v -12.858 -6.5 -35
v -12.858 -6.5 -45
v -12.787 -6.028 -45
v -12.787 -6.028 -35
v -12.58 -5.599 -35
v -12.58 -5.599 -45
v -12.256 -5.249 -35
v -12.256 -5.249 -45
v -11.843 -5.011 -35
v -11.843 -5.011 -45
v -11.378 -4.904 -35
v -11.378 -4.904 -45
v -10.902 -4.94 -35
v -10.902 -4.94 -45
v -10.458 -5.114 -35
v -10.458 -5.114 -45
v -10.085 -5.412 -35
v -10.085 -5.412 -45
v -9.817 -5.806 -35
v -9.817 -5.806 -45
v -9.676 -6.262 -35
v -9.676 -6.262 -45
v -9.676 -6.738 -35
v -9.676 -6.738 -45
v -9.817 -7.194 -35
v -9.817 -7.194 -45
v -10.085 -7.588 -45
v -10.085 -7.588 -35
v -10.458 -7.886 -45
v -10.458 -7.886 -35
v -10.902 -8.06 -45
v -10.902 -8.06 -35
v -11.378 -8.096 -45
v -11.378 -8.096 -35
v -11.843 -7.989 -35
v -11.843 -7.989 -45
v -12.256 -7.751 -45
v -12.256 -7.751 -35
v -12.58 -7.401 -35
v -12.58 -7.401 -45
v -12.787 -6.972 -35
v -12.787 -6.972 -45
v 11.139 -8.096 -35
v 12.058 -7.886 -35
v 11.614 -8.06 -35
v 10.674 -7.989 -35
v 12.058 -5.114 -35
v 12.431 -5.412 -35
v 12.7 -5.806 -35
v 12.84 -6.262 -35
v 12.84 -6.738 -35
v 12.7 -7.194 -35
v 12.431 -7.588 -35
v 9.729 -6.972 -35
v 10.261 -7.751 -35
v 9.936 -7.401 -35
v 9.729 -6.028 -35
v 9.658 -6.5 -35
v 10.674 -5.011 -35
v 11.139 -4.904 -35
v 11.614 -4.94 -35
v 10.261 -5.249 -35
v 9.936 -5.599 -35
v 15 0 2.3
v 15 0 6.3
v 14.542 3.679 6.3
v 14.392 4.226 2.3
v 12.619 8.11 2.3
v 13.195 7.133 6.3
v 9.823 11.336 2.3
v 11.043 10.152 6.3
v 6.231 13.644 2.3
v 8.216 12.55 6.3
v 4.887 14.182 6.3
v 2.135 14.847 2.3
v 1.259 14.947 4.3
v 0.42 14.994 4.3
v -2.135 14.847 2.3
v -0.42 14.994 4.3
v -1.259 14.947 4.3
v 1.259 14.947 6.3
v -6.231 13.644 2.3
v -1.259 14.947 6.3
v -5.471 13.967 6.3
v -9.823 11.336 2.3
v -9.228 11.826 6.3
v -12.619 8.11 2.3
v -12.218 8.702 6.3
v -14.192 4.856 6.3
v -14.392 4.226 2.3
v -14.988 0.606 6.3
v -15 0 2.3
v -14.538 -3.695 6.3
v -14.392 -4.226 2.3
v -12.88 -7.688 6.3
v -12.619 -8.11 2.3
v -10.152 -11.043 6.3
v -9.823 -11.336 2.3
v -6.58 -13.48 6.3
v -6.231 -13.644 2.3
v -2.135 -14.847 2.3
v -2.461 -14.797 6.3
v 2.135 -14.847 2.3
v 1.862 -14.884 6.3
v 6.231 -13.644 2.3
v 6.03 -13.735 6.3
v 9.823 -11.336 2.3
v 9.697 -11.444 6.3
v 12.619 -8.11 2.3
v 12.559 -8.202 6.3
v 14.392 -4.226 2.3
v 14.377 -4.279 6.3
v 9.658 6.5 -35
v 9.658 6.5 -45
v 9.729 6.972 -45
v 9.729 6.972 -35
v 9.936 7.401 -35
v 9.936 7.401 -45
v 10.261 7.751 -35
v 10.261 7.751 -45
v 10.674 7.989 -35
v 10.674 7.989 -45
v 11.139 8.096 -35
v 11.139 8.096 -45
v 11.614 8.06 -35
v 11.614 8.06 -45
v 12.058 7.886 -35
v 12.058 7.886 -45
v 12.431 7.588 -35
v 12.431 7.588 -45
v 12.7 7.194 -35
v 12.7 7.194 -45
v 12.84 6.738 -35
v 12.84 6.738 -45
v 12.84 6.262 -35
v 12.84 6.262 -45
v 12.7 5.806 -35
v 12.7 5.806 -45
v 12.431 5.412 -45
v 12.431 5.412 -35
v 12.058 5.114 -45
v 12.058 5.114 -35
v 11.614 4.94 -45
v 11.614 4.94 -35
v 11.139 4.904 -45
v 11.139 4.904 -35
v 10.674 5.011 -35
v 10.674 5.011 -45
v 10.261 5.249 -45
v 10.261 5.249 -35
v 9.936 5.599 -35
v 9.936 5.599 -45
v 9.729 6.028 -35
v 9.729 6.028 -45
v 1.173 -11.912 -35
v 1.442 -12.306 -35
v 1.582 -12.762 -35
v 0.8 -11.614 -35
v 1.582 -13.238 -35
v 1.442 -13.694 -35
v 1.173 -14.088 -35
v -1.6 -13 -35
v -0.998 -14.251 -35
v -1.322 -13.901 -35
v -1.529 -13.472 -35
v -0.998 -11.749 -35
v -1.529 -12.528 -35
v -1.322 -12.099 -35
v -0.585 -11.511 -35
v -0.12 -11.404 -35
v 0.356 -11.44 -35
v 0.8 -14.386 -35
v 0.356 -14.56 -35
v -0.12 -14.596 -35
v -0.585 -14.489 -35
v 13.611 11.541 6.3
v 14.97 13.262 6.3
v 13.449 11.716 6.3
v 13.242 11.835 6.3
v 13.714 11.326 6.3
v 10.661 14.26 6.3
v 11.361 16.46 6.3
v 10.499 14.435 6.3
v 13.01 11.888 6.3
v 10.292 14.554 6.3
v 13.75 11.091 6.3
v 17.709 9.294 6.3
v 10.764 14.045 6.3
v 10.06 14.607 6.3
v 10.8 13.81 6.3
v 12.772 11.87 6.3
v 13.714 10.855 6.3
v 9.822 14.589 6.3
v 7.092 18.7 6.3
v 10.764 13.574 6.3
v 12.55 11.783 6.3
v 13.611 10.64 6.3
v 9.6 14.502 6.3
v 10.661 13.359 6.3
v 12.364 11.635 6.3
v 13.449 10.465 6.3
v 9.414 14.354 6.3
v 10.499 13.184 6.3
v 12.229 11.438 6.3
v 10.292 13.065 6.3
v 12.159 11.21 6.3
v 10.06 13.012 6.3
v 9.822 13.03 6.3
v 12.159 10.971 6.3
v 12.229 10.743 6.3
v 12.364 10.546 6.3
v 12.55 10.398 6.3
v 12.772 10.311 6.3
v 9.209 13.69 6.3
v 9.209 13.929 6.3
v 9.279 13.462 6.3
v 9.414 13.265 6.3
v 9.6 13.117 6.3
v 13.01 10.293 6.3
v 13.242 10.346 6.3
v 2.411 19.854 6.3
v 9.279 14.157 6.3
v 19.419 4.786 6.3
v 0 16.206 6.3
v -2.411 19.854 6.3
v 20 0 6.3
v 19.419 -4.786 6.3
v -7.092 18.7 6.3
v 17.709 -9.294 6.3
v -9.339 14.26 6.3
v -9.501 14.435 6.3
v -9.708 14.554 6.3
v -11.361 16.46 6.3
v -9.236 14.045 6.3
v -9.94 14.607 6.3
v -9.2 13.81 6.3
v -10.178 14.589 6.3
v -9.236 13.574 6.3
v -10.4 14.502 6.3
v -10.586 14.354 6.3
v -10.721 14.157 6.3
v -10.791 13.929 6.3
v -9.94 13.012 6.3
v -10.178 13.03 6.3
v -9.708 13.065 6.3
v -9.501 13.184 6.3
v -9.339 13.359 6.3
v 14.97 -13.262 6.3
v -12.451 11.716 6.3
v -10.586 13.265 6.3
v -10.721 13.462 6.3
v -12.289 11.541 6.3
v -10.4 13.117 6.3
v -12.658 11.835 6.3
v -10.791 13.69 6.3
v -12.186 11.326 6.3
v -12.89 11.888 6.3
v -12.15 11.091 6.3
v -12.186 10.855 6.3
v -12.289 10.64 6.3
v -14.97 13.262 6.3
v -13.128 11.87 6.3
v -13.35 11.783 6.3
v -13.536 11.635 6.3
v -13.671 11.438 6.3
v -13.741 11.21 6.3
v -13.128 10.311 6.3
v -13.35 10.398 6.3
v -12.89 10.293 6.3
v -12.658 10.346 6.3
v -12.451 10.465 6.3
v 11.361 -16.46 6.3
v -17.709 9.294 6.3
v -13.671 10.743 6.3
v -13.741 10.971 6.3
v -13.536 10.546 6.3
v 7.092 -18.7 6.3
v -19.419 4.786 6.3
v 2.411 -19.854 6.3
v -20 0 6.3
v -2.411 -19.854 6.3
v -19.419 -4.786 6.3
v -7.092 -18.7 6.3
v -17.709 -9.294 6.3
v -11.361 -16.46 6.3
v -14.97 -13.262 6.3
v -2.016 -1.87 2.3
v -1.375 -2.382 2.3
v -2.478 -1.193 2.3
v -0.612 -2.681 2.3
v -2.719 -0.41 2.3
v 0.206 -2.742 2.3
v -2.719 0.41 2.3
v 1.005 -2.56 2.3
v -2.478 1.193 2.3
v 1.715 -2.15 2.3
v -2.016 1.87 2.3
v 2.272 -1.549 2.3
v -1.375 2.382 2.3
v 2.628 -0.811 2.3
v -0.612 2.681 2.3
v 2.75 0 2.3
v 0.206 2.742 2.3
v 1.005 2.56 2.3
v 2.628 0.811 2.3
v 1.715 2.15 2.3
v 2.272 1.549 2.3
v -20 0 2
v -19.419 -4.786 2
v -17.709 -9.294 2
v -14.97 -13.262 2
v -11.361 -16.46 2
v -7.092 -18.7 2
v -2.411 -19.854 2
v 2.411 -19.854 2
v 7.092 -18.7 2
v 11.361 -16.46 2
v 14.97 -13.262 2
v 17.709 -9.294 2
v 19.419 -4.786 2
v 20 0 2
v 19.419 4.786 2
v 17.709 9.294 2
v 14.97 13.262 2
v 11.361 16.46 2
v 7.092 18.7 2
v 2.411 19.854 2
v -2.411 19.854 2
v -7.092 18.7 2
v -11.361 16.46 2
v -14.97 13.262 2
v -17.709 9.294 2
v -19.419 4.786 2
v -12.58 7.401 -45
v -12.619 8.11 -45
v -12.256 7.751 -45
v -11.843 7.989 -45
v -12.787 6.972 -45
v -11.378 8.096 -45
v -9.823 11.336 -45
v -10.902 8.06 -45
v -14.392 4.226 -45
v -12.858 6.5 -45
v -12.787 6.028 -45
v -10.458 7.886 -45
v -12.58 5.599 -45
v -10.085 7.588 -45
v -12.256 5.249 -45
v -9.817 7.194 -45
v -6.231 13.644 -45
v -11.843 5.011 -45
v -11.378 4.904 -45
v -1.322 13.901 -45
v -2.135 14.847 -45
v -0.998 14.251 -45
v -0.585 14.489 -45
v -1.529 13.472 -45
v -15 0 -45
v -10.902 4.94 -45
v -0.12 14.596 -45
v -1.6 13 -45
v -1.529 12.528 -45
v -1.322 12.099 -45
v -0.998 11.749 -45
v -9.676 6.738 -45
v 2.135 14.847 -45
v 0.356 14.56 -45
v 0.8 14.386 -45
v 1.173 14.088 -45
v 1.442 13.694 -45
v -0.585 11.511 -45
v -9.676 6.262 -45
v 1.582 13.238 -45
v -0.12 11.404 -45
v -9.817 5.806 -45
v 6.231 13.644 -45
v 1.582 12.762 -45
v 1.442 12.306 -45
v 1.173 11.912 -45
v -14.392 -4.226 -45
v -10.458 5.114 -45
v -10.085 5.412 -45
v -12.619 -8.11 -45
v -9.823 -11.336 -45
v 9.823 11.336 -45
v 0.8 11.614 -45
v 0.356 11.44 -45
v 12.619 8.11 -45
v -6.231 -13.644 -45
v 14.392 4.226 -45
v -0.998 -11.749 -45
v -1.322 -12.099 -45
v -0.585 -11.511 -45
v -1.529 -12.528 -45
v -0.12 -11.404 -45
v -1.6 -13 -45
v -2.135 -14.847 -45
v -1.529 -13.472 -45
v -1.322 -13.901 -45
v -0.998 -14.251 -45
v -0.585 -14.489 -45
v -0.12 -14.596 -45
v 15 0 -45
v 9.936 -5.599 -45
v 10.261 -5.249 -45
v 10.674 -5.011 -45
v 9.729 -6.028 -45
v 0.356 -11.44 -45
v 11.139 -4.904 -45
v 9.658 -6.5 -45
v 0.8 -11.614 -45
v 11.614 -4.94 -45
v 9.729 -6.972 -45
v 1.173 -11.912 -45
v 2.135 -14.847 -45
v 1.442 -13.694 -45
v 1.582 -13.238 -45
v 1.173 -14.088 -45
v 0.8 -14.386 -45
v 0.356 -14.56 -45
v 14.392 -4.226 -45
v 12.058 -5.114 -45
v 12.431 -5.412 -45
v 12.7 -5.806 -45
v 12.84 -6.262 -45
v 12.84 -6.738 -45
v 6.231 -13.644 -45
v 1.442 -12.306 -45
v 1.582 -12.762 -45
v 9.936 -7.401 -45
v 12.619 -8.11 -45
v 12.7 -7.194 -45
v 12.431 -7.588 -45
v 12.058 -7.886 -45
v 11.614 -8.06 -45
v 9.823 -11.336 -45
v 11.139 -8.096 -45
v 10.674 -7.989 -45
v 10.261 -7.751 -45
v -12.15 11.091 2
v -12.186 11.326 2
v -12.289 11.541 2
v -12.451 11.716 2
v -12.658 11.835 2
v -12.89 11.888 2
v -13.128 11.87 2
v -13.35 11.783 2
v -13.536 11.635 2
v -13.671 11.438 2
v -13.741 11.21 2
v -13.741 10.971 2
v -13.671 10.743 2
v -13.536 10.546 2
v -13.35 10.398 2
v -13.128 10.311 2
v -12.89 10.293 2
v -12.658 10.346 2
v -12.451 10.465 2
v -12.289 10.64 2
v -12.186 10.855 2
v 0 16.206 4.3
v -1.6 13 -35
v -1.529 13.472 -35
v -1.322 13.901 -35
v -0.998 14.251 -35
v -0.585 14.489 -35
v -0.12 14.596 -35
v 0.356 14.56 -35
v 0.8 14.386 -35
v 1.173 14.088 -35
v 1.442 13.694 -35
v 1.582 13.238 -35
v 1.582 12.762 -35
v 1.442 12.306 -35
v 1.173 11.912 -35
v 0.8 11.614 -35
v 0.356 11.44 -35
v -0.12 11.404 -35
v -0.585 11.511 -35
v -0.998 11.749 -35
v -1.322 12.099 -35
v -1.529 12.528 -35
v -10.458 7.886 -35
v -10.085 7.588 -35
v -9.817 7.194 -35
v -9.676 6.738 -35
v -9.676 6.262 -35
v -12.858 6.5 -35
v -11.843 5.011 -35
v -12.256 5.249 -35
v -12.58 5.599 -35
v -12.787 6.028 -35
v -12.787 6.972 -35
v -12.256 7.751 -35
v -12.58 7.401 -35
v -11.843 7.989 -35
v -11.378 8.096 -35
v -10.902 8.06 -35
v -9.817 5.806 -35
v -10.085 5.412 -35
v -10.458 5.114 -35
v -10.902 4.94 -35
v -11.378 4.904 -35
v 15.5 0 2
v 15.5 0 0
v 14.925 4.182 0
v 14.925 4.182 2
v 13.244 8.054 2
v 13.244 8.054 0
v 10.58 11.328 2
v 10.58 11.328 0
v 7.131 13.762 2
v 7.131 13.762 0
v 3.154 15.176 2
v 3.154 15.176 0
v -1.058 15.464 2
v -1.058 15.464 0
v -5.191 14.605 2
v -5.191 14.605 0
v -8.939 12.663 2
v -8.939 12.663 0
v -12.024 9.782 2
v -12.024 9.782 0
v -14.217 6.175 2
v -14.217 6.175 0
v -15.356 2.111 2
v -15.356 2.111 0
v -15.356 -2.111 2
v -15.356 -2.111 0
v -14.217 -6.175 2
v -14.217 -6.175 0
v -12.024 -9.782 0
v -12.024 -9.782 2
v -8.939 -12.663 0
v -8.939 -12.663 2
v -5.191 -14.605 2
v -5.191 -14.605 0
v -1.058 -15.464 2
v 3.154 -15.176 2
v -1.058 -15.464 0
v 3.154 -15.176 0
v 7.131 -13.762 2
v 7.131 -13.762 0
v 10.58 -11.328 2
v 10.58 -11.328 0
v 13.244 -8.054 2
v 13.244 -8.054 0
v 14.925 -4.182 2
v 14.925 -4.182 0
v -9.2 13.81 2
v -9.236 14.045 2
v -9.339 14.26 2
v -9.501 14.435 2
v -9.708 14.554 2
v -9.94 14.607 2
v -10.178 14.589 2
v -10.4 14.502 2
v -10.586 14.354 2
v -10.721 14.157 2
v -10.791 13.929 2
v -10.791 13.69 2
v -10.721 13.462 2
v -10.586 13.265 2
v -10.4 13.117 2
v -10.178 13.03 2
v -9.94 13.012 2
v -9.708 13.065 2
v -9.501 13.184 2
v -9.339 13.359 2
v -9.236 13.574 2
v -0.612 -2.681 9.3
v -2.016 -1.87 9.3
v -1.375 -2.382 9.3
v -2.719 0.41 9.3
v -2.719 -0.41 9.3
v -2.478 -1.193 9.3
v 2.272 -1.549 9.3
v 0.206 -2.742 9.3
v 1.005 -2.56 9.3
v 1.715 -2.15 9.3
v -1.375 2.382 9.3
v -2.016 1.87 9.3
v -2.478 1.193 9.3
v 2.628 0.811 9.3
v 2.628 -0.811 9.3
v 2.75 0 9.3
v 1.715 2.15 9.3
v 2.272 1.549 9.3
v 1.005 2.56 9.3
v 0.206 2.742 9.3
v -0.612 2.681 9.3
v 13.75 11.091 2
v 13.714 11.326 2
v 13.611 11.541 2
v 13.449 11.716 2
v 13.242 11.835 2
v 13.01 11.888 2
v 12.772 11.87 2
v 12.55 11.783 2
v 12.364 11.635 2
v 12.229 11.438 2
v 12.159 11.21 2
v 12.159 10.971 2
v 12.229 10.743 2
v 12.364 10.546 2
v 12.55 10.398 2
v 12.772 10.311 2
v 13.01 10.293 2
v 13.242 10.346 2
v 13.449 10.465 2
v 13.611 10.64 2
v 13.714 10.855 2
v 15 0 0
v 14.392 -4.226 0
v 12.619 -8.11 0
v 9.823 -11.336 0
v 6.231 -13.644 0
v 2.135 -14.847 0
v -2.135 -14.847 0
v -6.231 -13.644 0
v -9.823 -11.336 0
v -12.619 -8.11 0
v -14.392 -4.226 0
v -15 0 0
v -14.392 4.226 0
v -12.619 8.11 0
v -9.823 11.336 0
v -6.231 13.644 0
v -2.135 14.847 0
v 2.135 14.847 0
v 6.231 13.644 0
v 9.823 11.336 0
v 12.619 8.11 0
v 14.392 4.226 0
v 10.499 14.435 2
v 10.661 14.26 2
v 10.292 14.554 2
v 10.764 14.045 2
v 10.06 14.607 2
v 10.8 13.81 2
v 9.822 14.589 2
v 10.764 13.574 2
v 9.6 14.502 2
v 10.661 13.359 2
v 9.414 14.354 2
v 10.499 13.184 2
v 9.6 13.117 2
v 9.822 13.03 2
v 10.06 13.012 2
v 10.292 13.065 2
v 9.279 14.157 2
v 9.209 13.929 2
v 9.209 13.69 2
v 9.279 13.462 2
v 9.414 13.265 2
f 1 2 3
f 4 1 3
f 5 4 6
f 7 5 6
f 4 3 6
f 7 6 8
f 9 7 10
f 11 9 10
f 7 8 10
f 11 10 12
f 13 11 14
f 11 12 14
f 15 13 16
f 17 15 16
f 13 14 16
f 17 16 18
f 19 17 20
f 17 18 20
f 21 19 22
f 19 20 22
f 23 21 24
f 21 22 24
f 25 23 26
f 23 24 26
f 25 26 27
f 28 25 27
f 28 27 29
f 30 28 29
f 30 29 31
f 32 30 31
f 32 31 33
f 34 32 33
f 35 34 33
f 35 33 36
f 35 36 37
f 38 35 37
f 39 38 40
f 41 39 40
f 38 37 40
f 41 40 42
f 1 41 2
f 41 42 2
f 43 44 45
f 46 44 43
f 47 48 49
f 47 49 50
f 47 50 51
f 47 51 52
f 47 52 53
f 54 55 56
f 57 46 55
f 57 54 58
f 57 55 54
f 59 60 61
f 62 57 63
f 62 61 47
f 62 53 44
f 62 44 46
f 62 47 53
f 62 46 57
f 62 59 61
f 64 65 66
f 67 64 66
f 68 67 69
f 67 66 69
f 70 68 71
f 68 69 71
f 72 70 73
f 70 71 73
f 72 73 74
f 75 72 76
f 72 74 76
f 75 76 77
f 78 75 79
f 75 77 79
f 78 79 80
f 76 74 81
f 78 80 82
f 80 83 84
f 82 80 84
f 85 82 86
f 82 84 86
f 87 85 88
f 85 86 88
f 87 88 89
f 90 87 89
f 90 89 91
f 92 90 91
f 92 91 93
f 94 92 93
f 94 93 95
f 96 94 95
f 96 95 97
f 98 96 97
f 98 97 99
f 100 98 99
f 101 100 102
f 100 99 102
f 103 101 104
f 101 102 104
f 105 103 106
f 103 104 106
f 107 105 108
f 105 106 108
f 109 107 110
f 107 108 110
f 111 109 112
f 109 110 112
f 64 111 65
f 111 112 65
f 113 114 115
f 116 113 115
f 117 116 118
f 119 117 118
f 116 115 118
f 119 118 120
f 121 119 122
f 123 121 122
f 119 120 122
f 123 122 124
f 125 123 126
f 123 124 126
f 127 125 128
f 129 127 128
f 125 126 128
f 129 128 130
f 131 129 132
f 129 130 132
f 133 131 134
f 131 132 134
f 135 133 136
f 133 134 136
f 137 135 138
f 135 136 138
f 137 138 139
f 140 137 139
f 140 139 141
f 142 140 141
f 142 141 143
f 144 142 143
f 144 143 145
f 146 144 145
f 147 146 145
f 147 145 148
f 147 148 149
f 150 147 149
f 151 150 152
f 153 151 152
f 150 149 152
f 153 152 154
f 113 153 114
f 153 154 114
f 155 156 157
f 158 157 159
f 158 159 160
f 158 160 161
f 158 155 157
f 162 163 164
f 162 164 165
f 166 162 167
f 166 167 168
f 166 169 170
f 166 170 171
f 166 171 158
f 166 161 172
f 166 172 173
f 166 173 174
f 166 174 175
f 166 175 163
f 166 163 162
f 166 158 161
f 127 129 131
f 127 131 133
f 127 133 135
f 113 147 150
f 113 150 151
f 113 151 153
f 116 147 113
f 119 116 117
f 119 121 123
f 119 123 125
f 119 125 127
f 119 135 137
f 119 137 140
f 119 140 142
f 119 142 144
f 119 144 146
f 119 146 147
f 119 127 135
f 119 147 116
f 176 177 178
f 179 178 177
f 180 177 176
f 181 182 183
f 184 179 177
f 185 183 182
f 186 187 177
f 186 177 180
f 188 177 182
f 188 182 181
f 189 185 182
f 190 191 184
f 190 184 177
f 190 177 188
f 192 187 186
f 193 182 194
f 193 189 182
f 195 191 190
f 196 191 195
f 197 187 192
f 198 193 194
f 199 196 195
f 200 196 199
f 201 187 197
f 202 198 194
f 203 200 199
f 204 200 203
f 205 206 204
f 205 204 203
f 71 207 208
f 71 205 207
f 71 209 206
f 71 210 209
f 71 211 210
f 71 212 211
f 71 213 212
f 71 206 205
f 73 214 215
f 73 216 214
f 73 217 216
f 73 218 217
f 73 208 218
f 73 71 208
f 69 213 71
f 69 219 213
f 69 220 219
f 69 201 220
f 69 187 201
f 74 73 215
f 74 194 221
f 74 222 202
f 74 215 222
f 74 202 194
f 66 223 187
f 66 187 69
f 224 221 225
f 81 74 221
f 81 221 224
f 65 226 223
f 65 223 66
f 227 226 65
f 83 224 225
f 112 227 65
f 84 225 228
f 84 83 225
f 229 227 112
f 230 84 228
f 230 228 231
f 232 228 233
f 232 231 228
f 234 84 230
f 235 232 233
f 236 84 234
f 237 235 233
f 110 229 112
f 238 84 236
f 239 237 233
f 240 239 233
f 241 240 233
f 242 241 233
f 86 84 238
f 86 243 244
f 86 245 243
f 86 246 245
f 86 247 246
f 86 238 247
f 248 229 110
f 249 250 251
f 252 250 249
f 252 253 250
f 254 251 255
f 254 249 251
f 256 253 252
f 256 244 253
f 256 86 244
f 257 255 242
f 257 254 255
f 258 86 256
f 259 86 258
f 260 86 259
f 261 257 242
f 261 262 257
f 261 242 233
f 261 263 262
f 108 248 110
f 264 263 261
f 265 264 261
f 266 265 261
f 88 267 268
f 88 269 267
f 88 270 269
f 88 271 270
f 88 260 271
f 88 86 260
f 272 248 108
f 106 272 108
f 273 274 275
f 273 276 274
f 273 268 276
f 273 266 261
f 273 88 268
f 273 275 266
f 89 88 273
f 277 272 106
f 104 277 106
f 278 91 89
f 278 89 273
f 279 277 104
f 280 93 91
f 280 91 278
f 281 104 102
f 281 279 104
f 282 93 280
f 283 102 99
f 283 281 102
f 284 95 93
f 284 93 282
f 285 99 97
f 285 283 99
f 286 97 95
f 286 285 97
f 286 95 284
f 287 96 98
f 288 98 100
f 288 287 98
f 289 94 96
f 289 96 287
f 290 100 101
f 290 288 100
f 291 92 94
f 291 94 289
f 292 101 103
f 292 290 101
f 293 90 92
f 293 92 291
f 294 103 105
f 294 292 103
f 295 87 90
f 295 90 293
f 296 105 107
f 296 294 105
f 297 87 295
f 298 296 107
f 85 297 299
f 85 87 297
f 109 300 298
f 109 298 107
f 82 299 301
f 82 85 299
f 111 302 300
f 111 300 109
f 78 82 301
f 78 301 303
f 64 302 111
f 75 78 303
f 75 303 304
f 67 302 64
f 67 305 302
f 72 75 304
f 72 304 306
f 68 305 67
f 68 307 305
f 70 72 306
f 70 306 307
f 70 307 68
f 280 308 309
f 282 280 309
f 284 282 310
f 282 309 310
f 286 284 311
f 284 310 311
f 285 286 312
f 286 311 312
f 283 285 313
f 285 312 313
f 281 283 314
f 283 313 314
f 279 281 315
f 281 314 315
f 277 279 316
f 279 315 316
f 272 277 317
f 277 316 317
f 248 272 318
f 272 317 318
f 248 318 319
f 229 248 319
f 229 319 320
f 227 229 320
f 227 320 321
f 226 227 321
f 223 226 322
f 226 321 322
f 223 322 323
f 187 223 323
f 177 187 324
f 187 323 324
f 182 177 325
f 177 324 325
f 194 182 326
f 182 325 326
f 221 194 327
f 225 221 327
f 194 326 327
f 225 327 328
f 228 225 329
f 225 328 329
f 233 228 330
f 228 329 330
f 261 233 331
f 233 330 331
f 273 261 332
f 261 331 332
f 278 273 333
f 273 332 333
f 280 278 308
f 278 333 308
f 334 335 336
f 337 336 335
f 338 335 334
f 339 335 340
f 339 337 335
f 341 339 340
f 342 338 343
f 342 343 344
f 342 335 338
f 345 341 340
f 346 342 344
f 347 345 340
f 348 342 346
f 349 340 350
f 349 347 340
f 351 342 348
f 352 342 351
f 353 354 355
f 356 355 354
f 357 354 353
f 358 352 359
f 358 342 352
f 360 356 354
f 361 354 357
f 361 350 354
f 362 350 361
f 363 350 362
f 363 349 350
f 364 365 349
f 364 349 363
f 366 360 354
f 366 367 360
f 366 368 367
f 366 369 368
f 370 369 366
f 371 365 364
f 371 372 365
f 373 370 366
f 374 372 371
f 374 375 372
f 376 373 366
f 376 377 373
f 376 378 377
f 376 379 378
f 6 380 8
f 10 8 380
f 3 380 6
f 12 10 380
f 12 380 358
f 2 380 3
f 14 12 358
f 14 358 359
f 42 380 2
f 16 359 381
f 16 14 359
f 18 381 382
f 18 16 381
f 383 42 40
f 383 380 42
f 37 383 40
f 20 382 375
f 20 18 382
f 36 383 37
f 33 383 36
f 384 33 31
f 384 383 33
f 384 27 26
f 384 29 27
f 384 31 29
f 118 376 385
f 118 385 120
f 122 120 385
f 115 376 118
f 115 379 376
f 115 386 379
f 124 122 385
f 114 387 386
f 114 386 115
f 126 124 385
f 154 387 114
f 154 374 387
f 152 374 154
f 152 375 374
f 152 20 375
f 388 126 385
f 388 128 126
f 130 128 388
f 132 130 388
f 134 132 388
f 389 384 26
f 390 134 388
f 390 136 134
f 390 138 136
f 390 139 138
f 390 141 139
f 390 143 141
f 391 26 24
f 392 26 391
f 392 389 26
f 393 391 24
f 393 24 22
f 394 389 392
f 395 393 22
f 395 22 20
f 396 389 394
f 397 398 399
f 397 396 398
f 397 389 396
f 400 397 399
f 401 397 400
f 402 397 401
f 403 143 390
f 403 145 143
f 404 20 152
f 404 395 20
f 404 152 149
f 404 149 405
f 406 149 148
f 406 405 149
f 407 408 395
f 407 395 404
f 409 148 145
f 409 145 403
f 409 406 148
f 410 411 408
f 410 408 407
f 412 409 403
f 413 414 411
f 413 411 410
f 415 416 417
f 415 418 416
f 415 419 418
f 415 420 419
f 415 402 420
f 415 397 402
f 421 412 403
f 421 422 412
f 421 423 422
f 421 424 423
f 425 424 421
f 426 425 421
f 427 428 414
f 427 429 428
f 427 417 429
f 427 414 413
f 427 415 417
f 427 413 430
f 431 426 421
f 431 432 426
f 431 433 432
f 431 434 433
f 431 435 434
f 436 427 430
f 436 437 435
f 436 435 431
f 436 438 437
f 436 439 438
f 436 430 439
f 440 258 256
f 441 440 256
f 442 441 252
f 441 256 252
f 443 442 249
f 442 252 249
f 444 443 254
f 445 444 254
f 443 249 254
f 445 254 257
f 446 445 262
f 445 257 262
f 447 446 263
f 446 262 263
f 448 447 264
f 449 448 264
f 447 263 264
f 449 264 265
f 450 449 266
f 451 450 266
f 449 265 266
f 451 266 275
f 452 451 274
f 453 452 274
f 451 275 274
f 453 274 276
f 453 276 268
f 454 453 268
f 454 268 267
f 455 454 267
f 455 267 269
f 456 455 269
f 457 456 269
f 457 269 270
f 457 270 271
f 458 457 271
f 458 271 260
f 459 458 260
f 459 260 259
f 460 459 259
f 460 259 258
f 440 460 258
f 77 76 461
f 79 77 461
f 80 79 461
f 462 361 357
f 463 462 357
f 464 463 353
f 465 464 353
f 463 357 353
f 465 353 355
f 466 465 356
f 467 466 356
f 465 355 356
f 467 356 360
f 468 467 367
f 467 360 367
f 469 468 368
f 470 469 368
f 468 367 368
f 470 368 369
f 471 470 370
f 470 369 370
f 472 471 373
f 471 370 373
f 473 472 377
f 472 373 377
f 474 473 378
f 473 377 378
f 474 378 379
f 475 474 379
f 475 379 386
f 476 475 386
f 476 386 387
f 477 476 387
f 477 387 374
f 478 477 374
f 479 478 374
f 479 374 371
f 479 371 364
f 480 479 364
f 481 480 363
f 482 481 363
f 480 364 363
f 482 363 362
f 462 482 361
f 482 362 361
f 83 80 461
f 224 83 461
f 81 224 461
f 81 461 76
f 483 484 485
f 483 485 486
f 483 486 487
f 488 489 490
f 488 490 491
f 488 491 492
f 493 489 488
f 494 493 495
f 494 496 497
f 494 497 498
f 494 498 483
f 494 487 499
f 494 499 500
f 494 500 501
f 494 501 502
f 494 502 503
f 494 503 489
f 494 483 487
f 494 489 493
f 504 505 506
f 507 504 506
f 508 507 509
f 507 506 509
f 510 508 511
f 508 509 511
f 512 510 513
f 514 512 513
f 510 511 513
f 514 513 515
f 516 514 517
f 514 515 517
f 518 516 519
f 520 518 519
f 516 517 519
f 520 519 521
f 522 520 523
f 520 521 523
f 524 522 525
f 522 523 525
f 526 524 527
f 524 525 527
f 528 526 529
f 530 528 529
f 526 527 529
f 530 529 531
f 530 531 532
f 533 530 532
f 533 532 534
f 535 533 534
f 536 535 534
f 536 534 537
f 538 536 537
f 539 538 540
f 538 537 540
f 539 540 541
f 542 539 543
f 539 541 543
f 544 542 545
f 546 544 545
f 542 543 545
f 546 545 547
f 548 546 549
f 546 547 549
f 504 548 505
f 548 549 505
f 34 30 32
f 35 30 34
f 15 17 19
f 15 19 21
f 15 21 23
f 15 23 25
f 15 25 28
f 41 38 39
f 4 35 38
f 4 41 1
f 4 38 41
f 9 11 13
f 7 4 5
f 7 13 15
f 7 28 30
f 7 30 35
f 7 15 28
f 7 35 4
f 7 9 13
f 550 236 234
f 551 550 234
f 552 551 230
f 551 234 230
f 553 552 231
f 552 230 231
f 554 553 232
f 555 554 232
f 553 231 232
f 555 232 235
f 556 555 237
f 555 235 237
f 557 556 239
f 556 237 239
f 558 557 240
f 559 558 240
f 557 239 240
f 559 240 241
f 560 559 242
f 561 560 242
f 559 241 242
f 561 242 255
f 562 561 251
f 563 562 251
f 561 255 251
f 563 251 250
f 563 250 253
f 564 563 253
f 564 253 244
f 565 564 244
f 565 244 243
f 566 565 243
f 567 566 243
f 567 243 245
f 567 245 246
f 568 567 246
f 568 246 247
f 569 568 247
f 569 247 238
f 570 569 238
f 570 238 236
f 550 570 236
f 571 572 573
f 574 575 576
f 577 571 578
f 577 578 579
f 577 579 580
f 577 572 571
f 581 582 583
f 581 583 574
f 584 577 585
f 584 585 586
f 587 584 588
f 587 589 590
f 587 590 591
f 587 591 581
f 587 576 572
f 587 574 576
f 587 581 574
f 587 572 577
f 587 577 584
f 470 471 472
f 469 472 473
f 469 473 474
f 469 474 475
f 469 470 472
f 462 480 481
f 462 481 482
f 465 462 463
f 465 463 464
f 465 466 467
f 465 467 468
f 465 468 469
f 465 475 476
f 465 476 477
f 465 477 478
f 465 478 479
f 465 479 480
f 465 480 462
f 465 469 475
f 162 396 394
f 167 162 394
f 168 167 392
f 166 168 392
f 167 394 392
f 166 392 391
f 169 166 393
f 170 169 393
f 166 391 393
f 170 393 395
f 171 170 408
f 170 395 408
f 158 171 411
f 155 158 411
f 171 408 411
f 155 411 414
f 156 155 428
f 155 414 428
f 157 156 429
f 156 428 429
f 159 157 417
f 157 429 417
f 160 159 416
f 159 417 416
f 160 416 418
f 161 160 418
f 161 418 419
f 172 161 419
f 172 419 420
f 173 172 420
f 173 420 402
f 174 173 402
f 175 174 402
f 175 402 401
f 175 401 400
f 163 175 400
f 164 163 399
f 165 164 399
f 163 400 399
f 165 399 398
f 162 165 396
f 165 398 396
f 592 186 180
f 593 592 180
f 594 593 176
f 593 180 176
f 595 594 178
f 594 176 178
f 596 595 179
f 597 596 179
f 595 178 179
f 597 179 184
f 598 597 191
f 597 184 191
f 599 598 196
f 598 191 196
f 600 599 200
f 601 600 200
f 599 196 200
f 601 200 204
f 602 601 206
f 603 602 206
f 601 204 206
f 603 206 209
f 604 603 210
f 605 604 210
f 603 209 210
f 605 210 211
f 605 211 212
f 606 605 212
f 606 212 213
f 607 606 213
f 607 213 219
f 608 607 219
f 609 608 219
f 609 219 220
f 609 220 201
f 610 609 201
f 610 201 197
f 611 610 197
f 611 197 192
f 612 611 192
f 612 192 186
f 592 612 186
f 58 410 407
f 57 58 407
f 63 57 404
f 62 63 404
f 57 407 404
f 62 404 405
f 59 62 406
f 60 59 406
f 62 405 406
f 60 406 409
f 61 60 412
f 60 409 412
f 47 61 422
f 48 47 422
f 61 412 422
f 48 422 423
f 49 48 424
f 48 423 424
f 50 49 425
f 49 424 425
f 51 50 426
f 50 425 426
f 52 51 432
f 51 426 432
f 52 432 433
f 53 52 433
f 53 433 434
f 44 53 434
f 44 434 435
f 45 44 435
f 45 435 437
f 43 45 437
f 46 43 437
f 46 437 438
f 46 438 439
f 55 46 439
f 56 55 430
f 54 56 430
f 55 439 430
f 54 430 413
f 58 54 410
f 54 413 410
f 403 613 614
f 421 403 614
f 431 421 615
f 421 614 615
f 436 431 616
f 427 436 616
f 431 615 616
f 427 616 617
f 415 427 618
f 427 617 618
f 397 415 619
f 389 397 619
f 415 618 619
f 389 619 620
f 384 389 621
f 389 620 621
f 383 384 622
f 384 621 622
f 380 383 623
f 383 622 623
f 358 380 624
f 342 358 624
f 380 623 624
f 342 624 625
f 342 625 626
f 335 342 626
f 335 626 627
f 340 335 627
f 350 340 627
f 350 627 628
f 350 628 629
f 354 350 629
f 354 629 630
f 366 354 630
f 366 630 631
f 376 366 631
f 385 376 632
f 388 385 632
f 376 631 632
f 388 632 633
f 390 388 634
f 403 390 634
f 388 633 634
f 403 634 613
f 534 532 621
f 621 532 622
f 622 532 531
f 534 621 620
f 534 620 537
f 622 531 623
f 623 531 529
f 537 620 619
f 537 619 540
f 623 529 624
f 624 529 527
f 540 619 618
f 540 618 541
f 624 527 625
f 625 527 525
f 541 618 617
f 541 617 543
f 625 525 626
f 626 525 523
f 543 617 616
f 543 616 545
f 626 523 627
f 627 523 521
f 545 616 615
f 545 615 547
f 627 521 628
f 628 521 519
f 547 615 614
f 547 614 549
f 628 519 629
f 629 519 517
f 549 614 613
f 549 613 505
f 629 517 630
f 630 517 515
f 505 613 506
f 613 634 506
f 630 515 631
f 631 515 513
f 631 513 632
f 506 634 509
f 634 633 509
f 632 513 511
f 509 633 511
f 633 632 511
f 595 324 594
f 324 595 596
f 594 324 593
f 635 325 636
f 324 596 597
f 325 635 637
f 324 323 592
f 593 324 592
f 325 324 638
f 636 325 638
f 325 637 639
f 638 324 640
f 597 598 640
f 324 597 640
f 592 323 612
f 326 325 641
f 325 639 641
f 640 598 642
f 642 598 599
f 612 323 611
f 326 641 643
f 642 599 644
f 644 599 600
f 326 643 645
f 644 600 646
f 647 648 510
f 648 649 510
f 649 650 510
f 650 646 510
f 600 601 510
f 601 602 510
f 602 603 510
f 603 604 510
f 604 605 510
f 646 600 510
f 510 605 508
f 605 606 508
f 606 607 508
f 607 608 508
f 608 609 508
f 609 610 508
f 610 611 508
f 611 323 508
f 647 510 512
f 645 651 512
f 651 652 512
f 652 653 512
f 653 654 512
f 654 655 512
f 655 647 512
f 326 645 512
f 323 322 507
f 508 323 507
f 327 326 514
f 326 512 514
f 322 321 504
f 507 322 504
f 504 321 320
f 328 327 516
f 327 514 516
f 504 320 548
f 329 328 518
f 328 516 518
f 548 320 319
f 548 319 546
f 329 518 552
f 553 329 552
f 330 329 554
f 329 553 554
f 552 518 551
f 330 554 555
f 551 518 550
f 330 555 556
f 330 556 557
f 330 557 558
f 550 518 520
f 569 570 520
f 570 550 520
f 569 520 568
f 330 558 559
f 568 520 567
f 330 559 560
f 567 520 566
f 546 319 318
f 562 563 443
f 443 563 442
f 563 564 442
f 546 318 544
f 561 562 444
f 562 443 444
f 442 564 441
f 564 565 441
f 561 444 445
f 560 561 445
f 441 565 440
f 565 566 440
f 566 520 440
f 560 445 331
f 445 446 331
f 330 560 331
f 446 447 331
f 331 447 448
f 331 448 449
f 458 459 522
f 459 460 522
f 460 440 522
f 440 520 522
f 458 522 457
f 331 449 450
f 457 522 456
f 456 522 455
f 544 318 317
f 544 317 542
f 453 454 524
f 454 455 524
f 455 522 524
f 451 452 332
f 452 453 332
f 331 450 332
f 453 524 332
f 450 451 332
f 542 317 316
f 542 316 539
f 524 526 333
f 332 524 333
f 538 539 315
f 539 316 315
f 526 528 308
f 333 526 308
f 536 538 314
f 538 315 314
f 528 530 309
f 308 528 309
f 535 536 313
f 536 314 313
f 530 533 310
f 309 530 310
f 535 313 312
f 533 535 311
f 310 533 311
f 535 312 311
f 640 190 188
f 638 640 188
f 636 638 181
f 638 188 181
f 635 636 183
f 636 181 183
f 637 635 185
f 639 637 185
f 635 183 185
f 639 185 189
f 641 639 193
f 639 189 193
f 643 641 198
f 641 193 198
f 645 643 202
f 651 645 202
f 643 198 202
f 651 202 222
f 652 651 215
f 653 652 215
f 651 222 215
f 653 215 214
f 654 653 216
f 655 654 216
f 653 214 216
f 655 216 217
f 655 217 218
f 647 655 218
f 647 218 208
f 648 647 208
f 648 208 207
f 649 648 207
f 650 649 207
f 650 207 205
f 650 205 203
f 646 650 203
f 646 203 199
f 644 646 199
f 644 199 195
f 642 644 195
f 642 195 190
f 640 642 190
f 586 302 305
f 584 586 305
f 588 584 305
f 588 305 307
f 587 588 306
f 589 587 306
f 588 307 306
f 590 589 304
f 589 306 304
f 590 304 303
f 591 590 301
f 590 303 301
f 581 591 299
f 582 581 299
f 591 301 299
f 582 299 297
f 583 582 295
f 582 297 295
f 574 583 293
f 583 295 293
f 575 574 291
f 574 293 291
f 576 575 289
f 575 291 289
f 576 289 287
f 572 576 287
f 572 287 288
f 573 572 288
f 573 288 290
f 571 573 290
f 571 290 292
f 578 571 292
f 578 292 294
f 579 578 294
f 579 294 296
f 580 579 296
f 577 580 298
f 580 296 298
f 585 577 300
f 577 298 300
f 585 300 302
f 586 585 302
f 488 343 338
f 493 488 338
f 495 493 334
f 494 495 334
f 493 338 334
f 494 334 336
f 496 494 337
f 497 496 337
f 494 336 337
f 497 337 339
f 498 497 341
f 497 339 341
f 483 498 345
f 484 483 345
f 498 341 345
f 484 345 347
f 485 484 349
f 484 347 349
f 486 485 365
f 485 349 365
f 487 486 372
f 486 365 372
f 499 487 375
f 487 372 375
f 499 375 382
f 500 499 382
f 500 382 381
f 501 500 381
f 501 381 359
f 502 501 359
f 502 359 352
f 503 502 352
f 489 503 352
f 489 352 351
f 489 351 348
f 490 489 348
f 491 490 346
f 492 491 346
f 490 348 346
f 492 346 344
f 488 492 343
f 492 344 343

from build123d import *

# Parameters (mm, degrees)
SKETCH_2_R          = 15.5
EXTRUDE_1_DEPTH     = 2
SKETCH_3_R          = 15
EXTRUDE_2_DEPTH     = 45
SKETCH_4_R          = 20
EXTRUDE_3_DEPTH     = 4.3
SKETCH_5_R          = 15
CUT_EXTRUDE_2_DEPTH = 4
SKETCH_6_R          = 2.75
EXTRUDE_4_DEPTH     = 7
SKETCH_7_R          = 0.8
CUT_EXTRUDE_3_DEPTH = 7
CUT_EXTRUDE_4_DEPTH = 2
SKETCH_10_R         = 1.6
CUT_EXTRUDE_5_DEPTH = 10


with BuildPart() as part:
    # 草图2 → 凸台-拉伸1 (new body)
    with BuildSketch(Plane.XY):
        Circle(SKETCH_2_R)
    extrude(amount=EXTRUDE_1_DEPTH)

    # 草图3 → 凸台-拉伸2 (add)
    with BuildSketch(Plane(origin=(0, 0, 0), x_dir=(-1, 0, 0), z_dir=(0, 0, -1))):
        with Locations(Location((0, 0, 0), (0, 0, 180))):
            Circle(SKETCH_3_R)
    extrude(amount=EXTRUDE_2_DEPTH)

    # 草图4 → 凸台-拉伸3 (add)
    with BuildSketch(Plane.XY.offset(2)):
        with Locations(Location((0, 0, 0), (0, 0, 180))):
            Circle(SKETCH_4_R)
    extrude(amount=EXTRUDE_3_DEPTH)

    # 草图5 → 切除-拉伸2 (cut)
    with BuildSketch(Plane.XY.offset(6.3)):
        Circle(SKETCH_5_R)
    extrude(amount=-CUT_EXTRUDE_2_DEPTH, mode=Mode.SUBTRACT)

    # 草图6 → 凸台-拉伸4 (add)
    with BuildSketch(Plane.XY.offset(2.3)):
        Circle(SKETCH_6_R)
    extrude(amount=EXTRUDE_4_DEPTH)

    # 草图7 → 切除-拉伸3 (cut)
    with BuildSketch(Plane.XY.offset(6.3)):
        with Locations((-10, 13.809507594)):
            Circle(SKETCH_7_R)
        with Locations((10, 13.809507594)):
            Circle(SKETCH_7_R)
        with Locations((-12.95, 11.090536506)):
            Circle(SKETCH_7_R)
        with Locations((12.95, 11.090536506)):
            Circle(SKETCH_7_R)
    extrude(amount=-CUT_EXTRUDE_3_DEPTH, mode=Mode.SUBTRACT)

    # 草图9 → 切除-拉伸4 (cut)
    with BuildSketch(Plane.XY.offset(6.3)):
        Polygon((-2.828427125, 13.378), (0, 16.206427125), (2.828427125, 13.378), (0, 10.549572875), align=None)
    extrude(amount=-CUT_EXTRUDE_4_DEPTH, mode=Mode.SUBTRACT)

    # 草图10 → 切除-拉伸5 (cut)
    with BuildSketch(Plane(origin=(0, 0, -45), x_dir=(-1, 0, 0), z_dir=(0, 0, -1))):
        with Locations((11.258330249, 6.5)):
            Circle(SKETCH_10_R)
        with Locations((0, 13)):
            Circle(SKETCH_10_R)
        with Locations((11.258330249, -6.5)):
            Circle(SKETCH_10_R)
        with Locations((0, -13)):
            Circle(SKETCH_10_R)
        with Locations((-11.258330249, -6.5)):
            Circle(SKETCH_10_R)
        with Locations((-11.258330249, 6.5)):
            Circle(SKETCH_10_R)
    extrude(amount=-CUT_EXTRUDE_5_DEPTH, mode=Mode.SUBTRACT)


solid = part.part
